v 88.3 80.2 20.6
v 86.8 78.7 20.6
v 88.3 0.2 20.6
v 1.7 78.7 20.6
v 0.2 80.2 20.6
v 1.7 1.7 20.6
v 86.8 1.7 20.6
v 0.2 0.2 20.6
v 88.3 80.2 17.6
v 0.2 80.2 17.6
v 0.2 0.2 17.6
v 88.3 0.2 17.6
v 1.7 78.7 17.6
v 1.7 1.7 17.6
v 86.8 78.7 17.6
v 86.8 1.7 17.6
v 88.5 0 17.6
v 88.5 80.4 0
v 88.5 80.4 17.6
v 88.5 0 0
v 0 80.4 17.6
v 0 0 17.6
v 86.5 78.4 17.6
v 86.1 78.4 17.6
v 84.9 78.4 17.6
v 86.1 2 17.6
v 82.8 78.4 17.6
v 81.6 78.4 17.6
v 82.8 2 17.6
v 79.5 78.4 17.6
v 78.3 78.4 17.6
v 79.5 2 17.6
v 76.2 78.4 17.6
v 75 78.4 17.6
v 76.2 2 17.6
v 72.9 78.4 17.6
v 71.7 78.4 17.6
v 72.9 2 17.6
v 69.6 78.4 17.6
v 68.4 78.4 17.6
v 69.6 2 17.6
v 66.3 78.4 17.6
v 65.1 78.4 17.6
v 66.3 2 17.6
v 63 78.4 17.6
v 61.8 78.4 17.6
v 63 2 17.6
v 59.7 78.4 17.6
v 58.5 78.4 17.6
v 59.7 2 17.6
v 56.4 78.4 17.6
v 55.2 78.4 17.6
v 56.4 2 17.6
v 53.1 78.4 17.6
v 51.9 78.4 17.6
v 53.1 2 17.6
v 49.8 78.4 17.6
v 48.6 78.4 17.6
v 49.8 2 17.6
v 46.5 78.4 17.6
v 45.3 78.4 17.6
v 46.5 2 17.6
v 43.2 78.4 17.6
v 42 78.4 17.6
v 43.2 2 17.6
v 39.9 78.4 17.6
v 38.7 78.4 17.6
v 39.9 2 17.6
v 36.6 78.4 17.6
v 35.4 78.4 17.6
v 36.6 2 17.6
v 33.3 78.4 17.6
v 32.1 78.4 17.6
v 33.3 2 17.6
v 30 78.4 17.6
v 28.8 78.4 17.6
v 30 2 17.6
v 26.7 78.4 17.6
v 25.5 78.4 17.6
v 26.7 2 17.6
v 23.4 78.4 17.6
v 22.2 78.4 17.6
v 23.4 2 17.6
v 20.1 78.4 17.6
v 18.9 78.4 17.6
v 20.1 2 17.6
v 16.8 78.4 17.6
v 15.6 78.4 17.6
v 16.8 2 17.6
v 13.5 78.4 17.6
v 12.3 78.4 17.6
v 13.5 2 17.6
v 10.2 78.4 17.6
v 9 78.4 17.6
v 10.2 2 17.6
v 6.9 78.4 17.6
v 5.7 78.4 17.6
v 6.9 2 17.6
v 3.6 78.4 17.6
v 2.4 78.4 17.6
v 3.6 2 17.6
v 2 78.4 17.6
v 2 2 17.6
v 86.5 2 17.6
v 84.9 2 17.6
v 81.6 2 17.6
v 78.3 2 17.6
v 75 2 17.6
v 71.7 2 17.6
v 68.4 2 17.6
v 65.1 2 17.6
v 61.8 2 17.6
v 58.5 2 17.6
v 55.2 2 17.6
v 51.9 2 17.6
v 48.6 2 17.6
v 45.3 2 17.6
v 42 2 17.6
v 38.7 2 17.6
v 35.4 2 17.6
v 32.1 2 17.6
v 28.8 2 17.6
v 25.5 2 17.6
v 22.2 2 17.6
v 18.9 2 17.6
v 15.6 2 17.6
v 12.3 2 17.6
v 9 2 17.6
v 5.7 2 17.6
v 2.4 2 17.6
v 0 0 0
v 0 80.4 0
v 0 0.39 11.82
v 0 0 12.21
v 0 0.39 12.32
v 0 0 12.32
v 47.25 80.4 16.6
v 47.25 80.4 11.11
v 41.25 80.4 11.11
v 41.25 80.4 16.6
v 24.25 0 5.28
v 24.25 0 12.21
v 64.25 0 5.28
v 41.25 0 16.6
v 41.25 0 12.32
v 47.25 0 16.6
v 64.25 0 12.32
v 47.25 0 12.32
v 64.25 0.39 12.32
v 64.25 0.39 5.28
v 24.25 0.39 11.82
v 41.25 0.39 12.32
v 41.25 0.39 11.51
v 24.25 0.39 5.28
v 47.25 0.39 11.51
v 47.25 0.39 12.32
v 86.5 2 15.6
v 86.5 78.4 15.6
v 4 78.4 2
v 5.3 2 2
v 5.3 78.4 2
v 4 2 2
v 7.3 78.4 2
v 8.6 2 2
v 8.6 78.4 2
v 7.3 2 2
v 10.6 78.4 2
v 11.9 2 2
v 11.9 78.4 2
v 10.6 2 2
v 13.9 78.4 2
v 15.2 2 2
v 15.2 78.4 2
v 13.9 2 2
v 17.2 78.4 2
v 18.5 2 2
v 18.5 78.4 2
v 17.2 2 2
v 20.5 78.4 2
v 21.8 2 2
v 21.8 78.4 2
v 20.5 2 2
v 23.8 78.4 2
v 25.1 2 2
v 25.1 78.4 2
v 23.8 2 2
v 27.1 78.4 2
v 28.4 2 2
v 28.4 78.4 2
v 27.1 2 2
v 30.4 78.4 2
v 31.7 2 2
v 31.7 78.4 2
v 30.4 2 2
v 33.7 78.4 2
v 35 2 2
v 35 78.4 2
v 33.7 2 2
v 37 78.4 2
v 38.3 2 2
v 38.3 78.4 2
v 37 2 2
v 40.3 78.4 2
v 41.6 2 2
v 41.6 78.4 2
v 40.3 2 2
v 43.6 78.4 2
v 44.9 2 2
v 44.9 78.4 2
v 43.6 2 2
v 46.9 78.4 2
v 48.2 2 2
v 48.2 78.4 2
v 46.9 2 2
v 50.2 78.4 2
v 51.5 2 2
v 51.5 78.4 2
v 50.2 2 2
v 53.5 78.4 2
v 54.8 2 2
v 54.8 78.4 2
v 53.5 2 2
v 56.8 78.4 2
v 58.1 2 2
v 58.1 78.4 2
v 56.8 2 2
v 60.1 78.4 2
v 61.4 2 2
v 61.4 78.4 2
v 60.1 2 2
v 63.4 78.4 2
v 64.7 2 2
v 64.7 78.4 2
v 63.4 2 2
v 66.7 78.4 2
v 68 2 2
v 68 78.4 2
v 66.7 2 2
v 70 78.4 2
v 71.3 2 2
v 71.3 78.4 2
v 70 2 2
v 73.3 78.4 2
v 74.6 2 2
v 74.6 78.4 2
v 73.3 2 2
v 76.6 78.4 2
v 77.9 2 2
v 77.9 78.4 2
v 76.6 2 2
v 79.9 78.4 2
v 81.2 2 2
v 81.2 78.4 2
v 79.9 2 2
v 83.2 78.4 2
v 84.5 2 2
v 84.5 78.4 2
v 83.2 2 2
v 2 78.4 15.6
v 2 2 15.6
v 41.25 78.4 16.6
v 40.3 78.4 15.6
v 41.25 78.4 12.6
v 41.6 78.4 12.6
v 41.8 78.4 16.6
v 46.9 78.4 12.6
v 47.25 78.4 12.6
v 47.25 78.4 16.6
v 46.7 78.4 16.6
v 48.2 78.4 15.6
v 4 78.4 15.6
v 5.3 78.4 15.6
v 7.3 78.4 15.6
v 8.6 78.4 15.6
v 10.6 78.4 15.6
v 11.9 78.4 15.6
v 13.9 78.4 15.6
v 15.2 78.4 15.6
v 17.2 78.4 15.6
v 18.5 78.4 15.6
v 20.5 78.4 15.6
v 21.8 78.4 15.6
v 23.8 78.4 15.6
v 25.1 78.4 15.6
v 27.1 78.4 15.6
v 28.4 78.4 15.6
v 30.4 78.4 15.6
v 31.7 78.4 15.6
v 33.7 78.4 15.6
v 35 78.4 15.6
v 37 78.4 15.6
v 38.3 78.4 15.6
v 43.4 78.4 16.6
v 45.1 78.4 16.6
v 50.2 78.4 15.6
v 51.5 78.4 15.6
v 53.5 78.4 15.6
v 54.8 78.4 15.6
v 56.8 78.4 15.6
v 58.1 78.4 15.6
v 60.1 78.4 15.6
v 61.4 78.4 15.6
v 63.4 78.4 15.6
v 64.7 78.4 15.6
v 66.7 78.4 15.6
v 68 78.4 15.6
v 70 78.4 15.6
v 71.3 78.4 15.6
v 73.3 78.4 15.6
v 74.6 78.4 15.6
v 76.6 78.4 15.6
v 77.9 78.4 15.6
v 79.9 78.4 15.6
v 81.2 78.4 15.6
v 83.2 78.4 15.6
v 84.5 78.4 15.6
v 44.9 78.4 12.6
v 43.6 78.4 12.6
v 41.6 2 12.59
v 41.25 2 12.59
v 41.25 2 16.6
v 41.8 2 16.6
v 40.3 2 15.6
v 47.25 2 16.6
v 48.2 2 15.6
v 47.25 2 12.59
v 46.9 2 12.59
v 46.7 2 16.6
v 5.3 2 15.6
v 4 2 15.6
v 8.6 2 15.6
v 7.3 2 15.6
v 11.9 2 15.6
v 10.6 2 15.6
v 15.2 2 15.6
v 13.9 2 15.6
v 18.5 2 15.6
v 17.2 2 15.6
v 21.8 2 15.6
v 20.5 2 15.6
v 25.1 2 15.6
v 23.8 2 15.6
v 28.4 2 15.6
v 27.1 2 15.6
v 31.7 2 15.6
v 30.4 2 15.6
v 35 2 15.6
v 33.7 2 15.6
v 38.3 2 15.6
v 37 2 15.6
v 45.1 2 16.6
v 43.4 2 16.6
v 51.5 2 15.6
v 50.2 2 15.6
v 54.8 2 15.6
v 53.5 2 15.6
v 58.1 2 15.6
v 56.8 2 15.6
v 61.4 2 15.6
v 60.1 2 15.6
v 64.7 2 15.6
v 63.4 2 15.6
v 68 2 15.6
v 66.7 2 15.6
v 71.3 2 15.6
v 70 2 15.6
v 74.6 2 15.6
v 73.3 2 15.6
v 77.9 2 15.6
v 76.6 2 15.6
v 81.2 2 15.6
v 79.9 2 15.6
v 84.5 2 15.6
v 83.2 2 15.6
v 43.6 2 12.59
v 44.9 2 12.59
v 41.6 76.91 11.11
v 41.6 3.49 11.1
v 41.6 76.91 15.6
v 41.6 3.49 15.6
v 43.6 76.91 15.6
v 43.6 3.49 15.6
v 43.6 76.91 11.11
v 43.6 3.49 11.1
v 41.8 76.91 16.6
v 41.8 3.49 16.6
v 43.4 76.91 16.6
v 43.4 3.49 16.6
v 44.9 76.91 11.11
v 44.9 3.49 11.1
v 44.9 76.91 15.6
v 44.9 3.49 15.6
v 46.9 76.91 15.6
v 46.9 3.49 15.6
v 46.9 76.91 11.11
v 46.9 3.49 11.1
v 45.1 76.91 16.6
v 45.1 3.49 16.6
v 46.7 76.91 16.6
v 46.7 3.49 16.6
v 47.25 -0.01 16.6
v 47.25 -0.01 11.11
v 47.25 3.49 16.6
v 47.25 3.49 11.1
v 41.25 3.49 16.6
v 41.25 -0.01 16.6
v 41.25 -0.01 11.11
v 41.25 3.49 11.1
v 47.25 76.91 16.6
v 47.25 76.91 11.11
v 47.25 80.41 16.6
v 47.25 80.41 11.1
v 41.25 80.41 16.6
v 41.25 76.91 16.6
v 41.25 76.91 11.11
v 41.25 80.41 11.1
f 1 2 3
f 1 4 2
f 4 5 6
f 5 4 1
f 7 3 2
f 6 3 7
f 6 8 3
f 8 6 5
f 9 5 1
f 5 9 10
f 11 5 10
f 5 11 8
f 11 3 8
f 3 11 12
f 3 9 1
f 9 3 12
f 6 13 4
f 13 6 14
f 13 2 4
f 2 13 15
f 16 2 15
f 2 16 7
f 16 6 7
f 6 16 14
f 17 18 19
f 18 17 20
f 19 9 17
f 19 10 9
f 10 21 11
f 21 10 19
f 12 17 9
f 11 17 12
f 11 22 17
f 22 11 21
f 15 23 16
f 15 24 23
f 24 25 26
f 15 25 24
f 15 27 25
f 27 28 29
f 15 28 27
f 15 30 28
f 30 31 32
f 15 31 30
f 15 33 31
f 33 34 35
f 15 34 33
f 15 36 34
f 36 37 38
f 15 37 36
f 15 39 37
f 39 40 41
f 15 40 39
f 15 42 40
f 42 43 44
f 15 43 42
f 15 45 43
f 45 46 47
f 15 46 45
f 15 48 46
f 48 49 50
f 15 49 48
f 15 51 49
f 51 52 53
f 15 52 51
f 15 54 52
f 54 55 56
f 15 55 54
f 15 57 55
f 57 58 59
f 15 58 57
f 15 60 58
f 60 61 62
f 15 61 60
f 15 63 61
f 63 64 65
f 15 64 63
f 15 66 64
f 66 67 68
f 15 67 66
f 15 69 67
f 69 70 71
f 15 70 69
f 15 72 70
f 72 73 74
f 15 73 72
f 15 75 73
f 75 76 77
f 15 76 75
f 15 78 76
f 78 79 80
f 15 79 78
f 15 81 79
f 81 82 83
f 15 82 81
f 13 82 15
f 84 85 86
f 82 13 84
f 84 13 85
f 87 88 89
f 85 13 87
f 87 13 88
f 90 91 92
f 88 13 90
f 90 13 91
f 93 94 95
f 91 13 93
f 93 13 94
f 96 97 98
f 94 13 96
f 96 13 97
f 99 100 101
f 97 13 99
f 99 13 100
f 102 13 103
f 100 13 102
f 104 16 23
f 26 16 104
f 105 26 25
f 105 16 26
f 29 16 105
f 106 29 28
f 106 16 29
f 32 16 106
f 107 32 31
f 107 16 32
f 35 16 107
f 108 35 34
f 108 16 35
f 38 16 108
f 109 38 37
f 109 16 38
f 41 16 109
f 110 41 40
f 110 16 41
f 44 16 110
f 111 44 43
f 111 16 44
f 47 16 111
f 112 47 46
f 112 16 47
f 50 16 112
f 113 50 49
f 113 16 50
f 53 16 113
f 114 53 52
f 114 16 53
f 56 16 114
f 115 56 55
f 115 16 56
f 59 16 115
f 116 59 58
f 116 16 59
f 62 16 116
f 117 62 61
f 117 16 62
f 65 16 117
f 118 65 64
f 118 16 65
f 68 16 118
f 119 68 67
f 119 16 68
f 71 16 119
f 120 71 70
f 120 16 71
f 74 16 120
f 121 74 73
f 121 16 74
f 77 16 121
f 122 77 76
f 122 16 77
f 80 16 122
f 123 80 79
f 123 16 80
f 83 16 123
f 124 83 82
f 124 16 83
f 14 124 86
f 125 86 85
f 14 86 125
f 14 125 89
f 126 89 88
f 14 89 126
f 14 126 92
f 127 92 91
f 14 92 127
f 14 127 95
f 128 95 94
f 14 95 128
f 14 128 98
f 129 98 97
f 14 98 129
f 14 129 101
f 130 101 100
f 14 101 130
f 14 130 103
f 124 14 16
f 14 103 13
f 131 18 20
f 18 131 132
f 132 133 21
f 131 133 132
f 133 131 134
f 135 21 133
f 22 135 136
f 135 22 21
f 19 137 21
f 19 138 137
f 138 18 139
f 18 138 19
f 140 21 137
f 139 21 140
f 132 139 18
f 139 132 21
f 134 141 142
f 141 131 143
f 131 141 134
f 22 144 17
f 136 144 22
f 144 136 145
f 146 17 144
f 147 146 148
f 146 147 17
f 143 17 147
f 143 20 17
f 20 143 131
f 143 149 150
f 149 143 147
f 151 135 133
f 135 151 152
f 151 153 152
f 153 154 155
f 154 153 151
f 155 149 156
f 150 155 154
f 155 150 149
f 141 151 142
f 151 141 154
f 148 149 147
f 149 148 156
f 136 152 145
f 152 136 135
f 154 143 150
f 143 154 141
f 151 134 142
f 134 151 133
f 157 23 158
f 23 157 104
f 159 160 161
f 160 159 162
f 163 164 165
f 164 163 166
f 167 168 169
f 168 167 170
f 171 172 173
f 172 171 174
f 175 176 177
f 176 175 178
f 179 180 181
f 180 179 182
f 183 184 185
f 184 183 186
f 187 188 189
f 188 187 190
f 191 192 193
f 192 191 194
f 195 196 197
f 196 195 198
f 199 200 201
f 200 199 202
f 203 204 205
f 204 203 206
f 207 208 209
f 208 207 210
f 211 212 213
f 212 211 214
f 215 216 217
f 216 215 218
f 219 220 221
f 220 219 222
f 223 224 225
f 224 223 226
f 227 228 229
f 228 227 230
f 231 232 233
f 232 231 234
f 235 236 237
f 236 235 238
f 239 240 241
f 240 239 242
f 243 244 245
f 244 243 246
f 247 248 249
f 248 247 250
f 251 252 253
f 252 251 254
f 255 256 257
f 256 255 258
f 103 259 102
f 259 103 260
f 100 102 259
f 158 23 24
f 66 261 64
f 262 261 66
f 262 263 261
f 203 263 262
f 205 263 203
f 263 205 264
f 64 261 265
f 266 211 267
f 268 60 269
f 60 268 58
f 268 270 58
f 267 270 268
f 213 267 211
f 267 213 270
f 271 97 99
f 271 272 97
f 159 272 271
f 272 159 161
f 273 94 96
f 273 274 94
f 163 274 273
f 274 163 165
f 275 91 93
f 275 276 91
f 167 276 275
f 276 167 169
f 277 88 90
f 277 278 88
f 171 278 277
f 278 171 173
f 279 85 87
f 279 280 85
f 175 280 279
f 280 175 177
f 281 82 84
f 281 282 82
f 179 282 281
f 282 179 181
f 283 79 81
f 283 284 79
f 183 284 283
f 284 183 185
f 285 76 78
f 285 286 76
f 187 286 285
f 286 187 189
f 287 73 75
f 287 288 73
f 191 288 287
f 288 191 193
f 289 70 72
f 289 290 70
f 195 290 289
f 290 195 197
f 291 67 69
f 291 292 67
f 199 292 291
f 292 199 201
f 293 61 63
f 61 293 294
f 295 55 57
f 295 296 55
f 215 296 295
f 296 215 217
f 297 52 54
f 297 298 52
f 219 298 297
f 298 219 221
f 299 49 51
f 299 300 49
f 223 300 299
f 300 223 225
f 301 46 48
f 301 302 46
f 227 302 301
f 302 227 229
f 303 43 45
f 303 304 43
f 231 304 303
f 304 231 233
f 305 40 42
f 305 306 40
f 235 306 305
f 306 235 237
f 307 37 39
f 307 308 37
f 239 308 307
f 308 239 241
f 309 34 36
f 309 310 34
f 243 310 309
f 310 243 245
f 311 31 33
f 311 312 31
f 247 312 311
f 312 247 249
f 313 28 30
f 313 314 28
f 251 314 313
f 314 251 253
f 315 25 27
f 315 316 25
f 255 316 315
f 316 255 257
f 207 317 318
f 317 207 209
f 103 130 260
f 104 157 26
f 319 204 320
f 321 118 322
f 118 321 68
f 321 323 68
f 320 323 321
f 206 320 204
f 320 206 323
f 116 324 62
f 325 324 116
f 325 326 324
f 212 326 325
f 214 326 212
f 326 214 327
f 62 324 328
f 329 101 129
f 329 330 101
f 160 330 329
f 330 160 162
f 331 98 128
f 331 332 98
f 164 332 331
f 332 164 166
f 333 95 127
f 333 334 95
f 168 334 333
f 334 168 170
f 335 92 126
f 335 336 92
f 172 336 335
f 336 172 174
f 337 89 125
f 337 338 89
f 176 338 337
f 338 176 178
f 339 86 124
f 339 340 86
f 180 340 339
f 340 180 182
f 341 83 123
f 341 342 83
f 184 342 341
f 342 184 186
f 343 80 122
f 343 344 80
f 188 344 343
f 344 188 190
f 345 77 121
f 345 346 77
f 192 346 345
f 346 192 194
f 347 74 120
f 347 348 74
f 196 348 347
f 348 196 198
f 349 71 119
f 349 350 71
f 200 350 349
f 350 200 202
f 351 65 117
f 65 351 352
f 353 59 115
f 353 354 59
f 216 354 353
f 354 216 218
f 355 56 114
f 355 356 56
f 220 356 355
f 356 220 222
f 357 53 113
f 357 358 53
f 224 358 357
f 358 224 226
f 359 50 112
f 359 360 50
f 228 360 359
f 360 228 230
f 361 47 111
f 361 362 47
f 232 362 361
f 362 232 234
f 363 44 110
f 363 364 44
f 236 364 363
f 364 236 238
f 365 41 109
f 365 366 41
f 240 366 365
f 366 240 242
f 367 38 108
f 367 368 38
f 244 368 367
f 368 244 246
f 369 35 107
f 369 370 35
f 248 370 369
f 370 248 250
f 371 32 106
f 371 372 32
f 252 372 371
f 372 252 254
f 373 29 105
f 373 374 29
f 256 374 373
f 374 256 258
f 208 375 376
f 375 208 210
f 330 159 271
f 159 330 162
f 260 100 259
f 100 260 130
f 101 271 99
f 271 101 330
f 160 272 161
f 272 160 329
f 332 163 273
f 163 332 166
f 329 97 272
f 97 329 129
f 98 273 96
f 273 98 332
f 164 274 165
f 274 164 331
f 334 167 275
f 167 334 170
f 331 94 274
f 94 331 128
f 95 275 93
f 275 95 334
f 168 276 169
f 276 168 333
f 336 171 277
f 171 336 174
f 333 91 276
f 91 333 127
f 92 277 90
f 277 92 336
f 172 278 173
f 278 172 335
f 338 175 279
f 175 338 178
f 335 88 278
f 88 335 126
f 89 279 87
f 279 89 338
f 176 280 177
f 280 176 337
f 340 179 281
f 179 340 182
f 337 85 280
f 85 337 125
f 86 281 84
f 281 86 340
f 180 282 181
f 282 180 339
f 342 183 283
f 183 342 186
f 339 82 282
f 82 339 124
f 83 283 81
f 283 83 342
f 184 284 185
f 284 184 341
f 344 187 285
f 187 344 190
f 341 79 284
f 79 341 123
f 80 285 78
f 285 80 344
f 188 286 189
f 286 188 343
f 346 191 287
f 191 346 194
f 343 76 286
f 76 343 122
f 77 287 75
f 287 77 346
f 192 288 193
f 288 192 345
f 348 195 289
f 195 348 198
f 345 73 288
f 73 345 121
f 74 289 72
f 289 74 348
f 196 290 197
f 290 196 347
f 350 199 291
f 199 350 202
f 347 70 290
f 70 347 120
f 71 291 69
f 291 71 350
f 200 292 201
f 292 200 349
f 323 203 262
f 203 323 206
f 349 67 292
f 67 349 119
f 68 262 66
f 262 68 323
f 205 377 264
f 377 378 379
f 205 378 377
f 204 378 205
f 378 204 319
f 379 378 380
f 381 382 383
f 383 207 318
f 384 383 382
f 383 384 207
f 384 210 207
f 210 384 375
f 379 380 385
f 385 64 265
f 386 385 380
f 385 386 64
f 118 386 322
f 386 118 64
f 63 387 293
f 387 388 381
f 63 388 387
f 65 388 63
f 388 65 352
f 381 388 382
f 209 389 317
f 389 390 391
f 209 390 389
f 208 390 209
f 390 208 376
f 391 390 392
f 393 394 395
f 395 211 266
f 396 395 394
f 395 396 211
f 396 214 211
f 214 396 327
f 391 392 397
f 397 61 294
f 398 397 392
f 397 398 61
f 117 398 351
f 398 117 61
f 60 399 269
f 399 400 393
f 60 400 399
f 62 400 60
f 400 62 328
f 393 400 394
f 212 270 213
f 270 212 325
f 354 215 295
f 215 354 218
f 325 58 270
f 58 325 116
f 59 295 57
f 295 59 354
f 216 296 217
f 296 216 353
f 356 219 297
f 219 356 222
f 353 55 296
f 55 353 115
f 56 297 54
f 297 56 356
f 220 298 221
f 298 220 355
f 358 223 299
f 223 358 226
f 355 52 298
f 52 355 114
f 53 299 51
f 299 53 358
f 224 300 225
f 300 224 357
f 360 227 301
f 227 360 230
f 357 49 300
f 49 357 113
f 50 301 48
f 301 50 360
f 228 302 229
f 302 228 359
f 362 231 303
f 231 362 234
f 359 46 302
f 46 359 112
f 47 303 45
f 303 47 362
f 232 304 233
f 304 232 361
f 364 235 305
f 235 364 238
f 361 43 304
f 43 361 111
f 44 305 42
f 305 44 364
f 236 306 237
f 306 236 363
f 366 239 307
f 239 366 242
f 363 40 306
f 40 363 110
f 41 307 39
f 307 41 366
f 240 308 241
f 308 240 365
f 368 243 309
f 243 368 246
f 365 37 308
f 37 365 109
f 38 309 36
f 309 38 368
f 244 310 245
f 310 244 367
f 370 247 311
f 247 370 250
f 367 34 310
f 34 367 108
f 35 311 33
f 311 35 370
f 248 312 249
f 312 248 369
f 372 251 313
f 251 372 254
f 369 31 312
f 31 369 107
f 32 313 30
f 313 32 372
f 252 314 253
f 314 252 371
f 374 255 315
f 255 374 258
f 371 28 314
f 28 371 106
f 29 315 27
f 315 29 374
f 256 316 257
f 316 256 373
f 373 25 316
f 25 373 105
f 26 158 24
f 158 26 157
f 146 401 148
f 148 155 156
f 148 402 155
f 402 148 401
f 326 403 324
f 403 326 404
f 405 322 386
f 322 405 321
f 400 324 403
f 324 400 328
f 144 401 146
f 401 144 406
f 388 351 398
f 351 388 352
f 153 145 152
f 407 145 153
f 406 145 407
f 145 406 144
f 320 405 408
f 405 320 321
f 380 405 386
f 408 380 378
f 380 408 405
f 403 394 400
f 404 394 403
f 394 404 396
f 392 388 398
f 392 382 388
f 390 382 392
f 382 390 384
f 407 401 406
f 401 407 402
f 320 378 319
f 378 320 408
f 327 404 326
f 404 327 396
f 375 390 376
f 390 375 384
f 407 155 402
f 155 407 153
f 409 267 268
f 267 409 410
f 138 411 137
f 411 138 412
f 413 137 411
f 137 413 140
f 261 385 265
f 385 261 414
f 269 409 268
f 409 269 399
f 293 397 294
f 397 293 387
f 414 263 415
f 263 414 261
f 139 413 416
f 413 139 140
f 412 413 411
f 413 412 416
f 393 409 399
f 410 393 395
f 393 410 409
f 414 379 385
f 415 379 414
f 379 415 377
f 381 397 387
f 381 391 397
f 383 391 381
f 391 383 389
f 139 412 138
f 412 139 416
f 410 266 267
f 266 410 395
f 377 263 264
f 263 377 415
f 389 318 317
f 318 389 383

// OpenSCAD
// file: libs/microscope-slide-hyperobject/slide.scad
// ----------------------------------------------------
// Material Hyperobject Compensations
// (Passed dynamically by the Commons API)
// ----------------------------------------------------
mat_shrinkage_x = 1.0;
mat_shrinkage_y = 1.0;
mat_shrinkage_z = 1.0;

mat_clear_press = 0.0;
mat_clear_slide = 0.0;
mat_clear_loose = 0.0;

// Standard Microscope Slide Dimensions (ISO 8037)
function slide_slot_width(thickness, tolerance) = thickness + tolerance + mat_clear_slide + 0.1;
function slide_pitch(slot_w, rib_w) = slot_w + rib_w;

module slide_retention_rib(height, depth, root_w, tip_w, chamfer_h) {
  // ONE polyhedron, not a cube unioned with a chamfer cap.
  //
  // The rib used to be `cube([root_w, depth, height - chamfer_h])` unioned with
  // a polyhedron frustum that started at exactly z = height - chamfer_h. That
  // is a zero-overlap coincident-face union: the two solids share an exact
  // plane and touch on it rather than interpenetrating. CGAL resolves it, but
  // OpenSCAD's Manifold backend -- which is what the platform and
  // `y4d-spec check --render` both use -- snaps near-coincident vertices and
  // tears the pair apart at that plane. Three or more ribs in one array was
  // enough: a 4-rib array came out as 8 shells, not watertight, and a 20-slot
  // box_base as 119 bodies with 26 of them negative.
  //
  // Written as a single closed polyhedron there is no interface plane at all,
  // so there is nothing to tear. Faces are wound CLOCKWISE seen from outside,
  // which is what OpenSCAD wants (the opposite of a CadQuery Shell); wound the
  // other way it renders NoError but inside-out.
  //
  // Volume and extents are unchanged to 3 decimal places; only the redundant
  // interface faces go away (28 -> 20 facets per rib).
  _ch = min(chamfer_h, height);
  _bz = height - _ch;
  _lo = (root_w - tip_w) / 2;
  _hi = (root_w + tip_w) / 2;
  polyhedron(
    points=[
      // 0-3: base, z = 0
      [0, 0, 0], [root_w, 0, 0], [root_w, depth, 0], [0, depth, 0],
      // 4-7: chamfer start, z = height - chamfer_h
      [0, 0, _bz], [root_w, 0, _bz], [root_w, depth, _bz], [0, depth, _bz],
      // 8-11: tip, z = height
      [_lo, 0, height], [_hi, 0, height], [_hi, depth, height], [_lo, depth, height],
    ],
    faces=[
      [0, 1, 2, 3],                                        // base
      [11, 10, 9, 8],                                      // tip (opposite base winding)
      [0, 4, 5, 1], [1, 5, 6, 2], [2, 6, 7, 3], [3, 7, 4, 0],       // prism sides
      [4, 8, 9, 5], [5, 9, 10, 6], [6, 10, 11, 7], [7, 11, 8, 4],   // chamfer sides
    ]
  );
}

module slide_slot_array(count, pitch, height, depth, root_w, tip_w, chamfer_h, tapered) {
  for (i = [0:count]) {
    translate([i * pitch, 0, 0])
      slide_retention_rib(height, depth, root_w, tip_w, chamfer_h);
  }
}

// ----------------------------------------------------
// ISO 8037-1 Bounded 4D Geometry
// ----------------------------------------------------

module iso_8037_slide(length, width, thickness) {
  // A standard microscope slide volumetric cartridge.
  // Glass usually has polished or ground edges.
  cube([length, width, thickness], center=true);
}

// ----------------------------------------------------
// Cartridge Execution Logic (Triggered by Manifest)
// ----------------------------------------------------

slide_standard = 0; // [0:ISO 8037-1 Primary, 1:ISO 8037-1 Alternate, 2:ISO 8255 #1.5H Cover, 3:ISO 8255 #1 Cover, 4:Custom]
custom_slide_length = 76.0;
custom_slide_width = 26.0;
custom_slide_thickness = 1.0;

render_mode = 0; // [0:main]

if (render_mode == 0) {
  // Material simulation logic for transparency via OpenSCAD nightly alpha
  color([0.8, 0.9, 0.9, 0.4]) {
    // Apply Material Hyperobject Shrinkage Compensation
    scale([mat_shrinkage_x, mat_shrinkage_y, mat_shrinkage_z]) {
      if (slide_standard == 0) {
        // ISO 8037-1 Primary
        iso_8037_slide(76.0, 26.0, 1.0);
      } else if (slide_standard == 1) {
        // ISO 8037-1 Alternate
        iso_8037_slide(75.0, 25.0, 1.0);
      } else if (slide_standard == 2) {
        // ISO 8255 #1.5H Cover Glass
        iso_8037_slide(22.0, 22.0, 0.17);
      } else if (slide_standard == 3) {
        // ISO 8255 #1 Cover Glass
        iso_8037_slide(22.0, 22.0, 0.15);
      } else if (slide_standard == 4) {
        // Custom Geometry
        iso_8037_slide(custom_slide_length, custom_slide_width, custom_slide_thickness);
      }
    }
  }
}
// main file
// ============================================================================
// box.scad — Class II: Vertical Slotted Storage Box
// ============================================================================
// Reference: docs/RESEARCH.pdf §5 (Vertical Slotted Systems)
//
// The classic "25-place" / "100-place" slide box. Slides stand vertically in
// parallel slots formed by tapered ribs with chamfered lead-ins.
//
// Parts:
//   render_mode 0 → box_base   (slotted trough + optional stacking lip)
//   render_mode 1 → box_lid    (snap-fit lid + optional stacking groove)
// ============================================================================

use <slide_lib.scad>

EPSILON = 0.01;
RIB_OVERLAP = 0.5;
LABEL_DEPTH = 0.4;

// ---------------------------------------------------------------------------
// Parameters (injected by platform via -D)
// ---------------------------------------------------------------------------

// --- Slide Standard ---
slide_standard = 0; // 0=ISO, 1=US, 2=Petrographic, 3=Supa Mega, 4=Custom
custom_slide_length = 76;
custom_slide_width = 26;
custom_slide_thickness = 1.0;

// --- Architecture ---
num_slots = 25; // Number of slide positions
density = 1; // 0=archival, 1=working, 2=staining, 3=mailer

// --- Tolerances ---
tolerance_xy = 0.4; // XY clearance (mm)
tolerance_z = 0.2; // Z / thickness clearance (mm)

// --- Structure ---
wall_thickness = 2.0; // Outer wall thickness (mm)
floor_thickness = 2.0; // Base floor thickness (mm)

// --- Box-specific ---
rib_profile = 0; // 0=tapered, 1=rectangular
rib_width = 2.0; // Rib root width (mm)
lid_latch = 0; // 0=snap, 1=magnetic, 2=none
stackable = 1; // 1=generate stacking lip/groove
numbering_start = -1; // First slot number for debossed labels

// --- Features ---
label_area = 1; // 1=generate debossed label recess

// --- Quality ---
fn = 0; // Resolution ($fn), 0 = auto

// --- Mode ---
render_mode = 0; // 0=box_base, 1=box_lid

// ---------------------------------------------------------------------------
// Resolution
// ---------------------------------------------------------------------------
$fn = fn > 0 ? fn : 32;

// ---------------------------------------------------------------------------
// Resolve Slide Dimensions
// ---------------------------------------------------------------------------
_slide = resolve_slide(
  slide_standard, custom_slide_length,
  custom_slide_width, custom_slide_thickness
);
_sl = _slide[0]; // slide length
_sw = _slide[1]; // slide width
_st = _slide[2]; // slide thickness

// ---------------------------------------------------------------------------
// Derived Dimensions (RESEARCH §5.1.2, §8.2)
// ---------------------------------------------------------------------------
_rib_w = rib_width;
_rib_tip_w = rib_profile == 0 ? _rib_w * 0.6 : _rib_w;
_slot_w = slot_width(_st, tolerance_z);
_pitch = pitch(_slot_w, _rib_w);

// Rib / slot height: slides sit in slots up to half their width
_slot_depth = _sw * 0.6;
_rib_height = _slot_depth;
_chamfer_h = rib_profile == 0 ? min(2.0, _rib_height * 0.15) : 0;

// Body envelope
_body_x = (num_slots * _pitch) + _rib_w + (2 * wall_thickness);
_body_y = _sl + (2 * wall_thickness) + tolerance_xy;
_body_z = _rib_height + floor_thickness;

// Lid dimensions
_lid_clearance = 0.3;
_lid_wall = 1.5;
_lid_z = 8; // lid height

// Snap latch (RESEARCH §5.3)
_latch_arm_len = 15; // PLA yield-safe minimum
_latch_arm_w = 6;
_latch_arm_t = 1.2;
_latch_hook_h = 2;
_latch_hook_d = 1.5;

// Stacking lip (RESEARCH §4.4)
_lip_h = 3;
_lip_w = 1.5;
_lip_inset = 0.2;    // keeps the lip's outer faces off the shell's side planes
_latch_inset = 0.2;  // same, for the lid's latch arms

// ---------------------------------------------------------------------------
// box_base — Slotted trough with ribs
// ---------------------------------------------------------------------------
module box_base() {
  union() {
    difference() {
      union() {
        // Outer shell
        cube([_body_x, _body_y, _body_z]);

        // Stacking lip on top perimeter.
        //
        // INSET by _lip_inset. Sitting the lip flush at the full _body_x /
        // _body_y left its four outer faces exactly COPLANAR with the shell's
        // four sides, and that coincident-face union is what made box_base
        // non-watertight in every preset (5 bodies at defaults). An inset of
        // as little as 0.01 mm resolves it; _lip_inset is the printer
        // clearance, so the lip is also correctly a hair proud of nothing --
        // a stacking lip the next box drops over should not be flush with the
        // wall it rises from.
        if (stackable == 1) {
          translate([_lip_inset, _lip_inset, _body_z - EPSILON])
            stacking_lip(
              _body_x - 2 * _lip_inset, _body_y - 2 * _lip_inset,
              _lip_h + EPSILON, _lip_w
            );
        }
      }

      // Hollow interior
      translate([wall_thickness, wall_thickness, floor_thickness])
        cube(
          [
            _body_x - 2 * wall_thickness,
            _body_y - 2 * wall_thickness,
            _rib_height + 1, // cut above rib height
          ]
        );

      // Label recess on front face
      if (label_area == 1) {
        _label_w = min(40, _body_x * 0.5);
        _label_h = min(12, _body_z * 0.4);
        translate([(_body_x - _label_w) / 2, -EPSILON, (_body_z - _label_h) / 2])
          rotate([90, 0, 0])
            translate([0, 0, -LABEL_DEPTH])
              label_recess(_label_w, _label_h, 0.5);
        // 0.5 is depth+epsilon
      }

      // Debossed slot numbers (suppress when fn=0 for draft speed)
      if (numbering_start >= 0 && fn > 0) {
        for (i = [0:num_slots - 1]) {
          _num = numbering_start + i;
          _x = wall_thickness + (i * _pitch) + _pitch / 2;
          translate([_x, _body_y - EPSILON, floor_thickness + 2])
            rotate([90, 0, 0])
              linear_extrude(height=0.5)
                text(
                  str(_num), size=min(3, _pitch * 0.7),
                  halign="center", valign="bottom",
                  font="Liberation Sans:style=Bold"
                );
        }
      }
    }

    // Rib array inside the box
    translate([wall_thickness, wall_thickness - 0.25, floor_thickness - RIB_OVERLAP]) {
      _tapered = rib_profile == 0 ? true : false;
      // Rotate ribs so they extrude along Y (slide length direction)
      rotate([0, 0, 0])
        slot_array(
          count=num_slots,
          pitch=_pitch,
          height=_rib_height + RIB_OVERLAP,
          depth=_body_y - 2 * wall_thickness + RIB_OVERLAP,
          root_w=_rib_w,
          tip_w=_rib_tip_w,
          chamfer_h=_chamfer_h,
          tapered=_tapered
        );
    }

    // Snap latch catches on base (one per long side)
    if (lid_latch == 0) {
      // Front catch
      translate([_body_x / 2 - _latch_arm_w / 2, -EPSILON, _body_z - _latch_hook_h - 1])
        snap_latch_catch(_latch_arm_w, _latch_hook_h, wall_thickness + _latch_hook_d);

      // Back catch
      translate([_body_x / 2 - _latch_arm_w / 2, _body_y - wall_thickness - _latch_hook_d + EPSILON, _body_z - _latch_hook_h - 1])
        snap_latch_catch(_latch_arm_w, _latch_hook_h, wall_thickness + _latch_hook_d);
    }
  }
}

// ---------------------------------------------------------------------------
// box_lid — Snap-fit lid
// ---------------------------------------------------------------------------
module box_lid() {
  _inner_x = _body_x + _lid_clearance * 2;
  _inner_y = _body_y + _lid_clearance * 2;
  _outer_x = _inner_x + _lid_wall * 2;
  _outer_y = _inner_y + _lid_wall * 2;
  _label_w = min(50, _outer_x * 0.6);
  _label_h = min(20, _outer_y * 0.3);

  // The lid is ONE difference(): everything additive (shell + latch arms) in
  // the first operand, everything subtractive (cavity, stacking groove, label
  // recess) after it.
  //
  // Previously the latch arms AND the label recess sat outside the
  // difference(), at the bottom of the module, as bare siblings. So the arms
  // were never fused to the shell, and the label recess -- a recess -- was
  // UNIONED onto the lid as a raised block instead of being cut into it. That
  // is box_lid's 3 bodies, not watertight.
  difference() {
    union() {
      // Outer lid shell
      cube([_outer_x, _outer_y, _lid_z]);

      // Snap latch arms (one per long side).
      //
      // Inset by _latch_inset. Placed flush at y = 0 and
      // y = _outer_y - _latch_arm_t, each arm's outer face was exactly
      // COPLANAR with the lid shell's own side face -- the same
      // coincident-face union that broke the base's stacking lip.
      if (lid_latch == 0) {
        // Front arm
        translate([_outer_x / 2 - _latch_arm_w / 2, _latch_inset, _lid_z])
          mirror([0, 0, 1])
            snap_latch_arm(
              _latch_arm_len, _latch_arm_w,
              _latch_arm_t, _latch_hook_h, _latch_hook_d
            );

        // Back arm
        translate([_outer_x / 2 - _latch_arm_w / 2,
                   _outer_y - _latch_arm_t - _latch_inset, _lid_z])
          mirror([0, 0, 1])
            snap_latch_arm(
              _latch_arm_len, _latch_arm_w,
              _latch_arm_t, _latch_hook_h, _latch_hook_d
            );
      }
    }

    // Hollow interior (slides over base top)
    translate([_lid_wall, _lid_wall, 1.5])
      cube([_inner_x, _inner_y, _lid_z]);

    // Stacking groove on top (if stackable)
    if (stackable == 1) {
      translate(
        [
          _lid_wall - _lip_w - 0.1,
          _lid_wall - _lip_w - 0.1,
          _lid_z - 3.2,
        ]
      )
        stacking_groove(
          _inner_x + (_lip_w + 0.1) * 2,
          _inner_y + (_lip_w + 0.1) * 2,
          3.2, _lip_w + 0.2
        );
    }

    // Label recess on lid top -- CUT, not added.
    if (label_area == 1) {
      translate([(_outer_x - _label_w) / 2, (_outer_y - _label_h) / 2,
                 _lid_z - LABEL_DEPTH + EPSILON])
        label_recess(_label_w, _label_h, LABEL_DEPTH);
    }
  }
}

// ---------------------------------------------------------------------------
// Render Mode Dispatch
// ---------------------------------------------------------------------------
if (render_mode == 0) {
  box_base();
}

if (render_mode == 1) {
  box_lid();
}
